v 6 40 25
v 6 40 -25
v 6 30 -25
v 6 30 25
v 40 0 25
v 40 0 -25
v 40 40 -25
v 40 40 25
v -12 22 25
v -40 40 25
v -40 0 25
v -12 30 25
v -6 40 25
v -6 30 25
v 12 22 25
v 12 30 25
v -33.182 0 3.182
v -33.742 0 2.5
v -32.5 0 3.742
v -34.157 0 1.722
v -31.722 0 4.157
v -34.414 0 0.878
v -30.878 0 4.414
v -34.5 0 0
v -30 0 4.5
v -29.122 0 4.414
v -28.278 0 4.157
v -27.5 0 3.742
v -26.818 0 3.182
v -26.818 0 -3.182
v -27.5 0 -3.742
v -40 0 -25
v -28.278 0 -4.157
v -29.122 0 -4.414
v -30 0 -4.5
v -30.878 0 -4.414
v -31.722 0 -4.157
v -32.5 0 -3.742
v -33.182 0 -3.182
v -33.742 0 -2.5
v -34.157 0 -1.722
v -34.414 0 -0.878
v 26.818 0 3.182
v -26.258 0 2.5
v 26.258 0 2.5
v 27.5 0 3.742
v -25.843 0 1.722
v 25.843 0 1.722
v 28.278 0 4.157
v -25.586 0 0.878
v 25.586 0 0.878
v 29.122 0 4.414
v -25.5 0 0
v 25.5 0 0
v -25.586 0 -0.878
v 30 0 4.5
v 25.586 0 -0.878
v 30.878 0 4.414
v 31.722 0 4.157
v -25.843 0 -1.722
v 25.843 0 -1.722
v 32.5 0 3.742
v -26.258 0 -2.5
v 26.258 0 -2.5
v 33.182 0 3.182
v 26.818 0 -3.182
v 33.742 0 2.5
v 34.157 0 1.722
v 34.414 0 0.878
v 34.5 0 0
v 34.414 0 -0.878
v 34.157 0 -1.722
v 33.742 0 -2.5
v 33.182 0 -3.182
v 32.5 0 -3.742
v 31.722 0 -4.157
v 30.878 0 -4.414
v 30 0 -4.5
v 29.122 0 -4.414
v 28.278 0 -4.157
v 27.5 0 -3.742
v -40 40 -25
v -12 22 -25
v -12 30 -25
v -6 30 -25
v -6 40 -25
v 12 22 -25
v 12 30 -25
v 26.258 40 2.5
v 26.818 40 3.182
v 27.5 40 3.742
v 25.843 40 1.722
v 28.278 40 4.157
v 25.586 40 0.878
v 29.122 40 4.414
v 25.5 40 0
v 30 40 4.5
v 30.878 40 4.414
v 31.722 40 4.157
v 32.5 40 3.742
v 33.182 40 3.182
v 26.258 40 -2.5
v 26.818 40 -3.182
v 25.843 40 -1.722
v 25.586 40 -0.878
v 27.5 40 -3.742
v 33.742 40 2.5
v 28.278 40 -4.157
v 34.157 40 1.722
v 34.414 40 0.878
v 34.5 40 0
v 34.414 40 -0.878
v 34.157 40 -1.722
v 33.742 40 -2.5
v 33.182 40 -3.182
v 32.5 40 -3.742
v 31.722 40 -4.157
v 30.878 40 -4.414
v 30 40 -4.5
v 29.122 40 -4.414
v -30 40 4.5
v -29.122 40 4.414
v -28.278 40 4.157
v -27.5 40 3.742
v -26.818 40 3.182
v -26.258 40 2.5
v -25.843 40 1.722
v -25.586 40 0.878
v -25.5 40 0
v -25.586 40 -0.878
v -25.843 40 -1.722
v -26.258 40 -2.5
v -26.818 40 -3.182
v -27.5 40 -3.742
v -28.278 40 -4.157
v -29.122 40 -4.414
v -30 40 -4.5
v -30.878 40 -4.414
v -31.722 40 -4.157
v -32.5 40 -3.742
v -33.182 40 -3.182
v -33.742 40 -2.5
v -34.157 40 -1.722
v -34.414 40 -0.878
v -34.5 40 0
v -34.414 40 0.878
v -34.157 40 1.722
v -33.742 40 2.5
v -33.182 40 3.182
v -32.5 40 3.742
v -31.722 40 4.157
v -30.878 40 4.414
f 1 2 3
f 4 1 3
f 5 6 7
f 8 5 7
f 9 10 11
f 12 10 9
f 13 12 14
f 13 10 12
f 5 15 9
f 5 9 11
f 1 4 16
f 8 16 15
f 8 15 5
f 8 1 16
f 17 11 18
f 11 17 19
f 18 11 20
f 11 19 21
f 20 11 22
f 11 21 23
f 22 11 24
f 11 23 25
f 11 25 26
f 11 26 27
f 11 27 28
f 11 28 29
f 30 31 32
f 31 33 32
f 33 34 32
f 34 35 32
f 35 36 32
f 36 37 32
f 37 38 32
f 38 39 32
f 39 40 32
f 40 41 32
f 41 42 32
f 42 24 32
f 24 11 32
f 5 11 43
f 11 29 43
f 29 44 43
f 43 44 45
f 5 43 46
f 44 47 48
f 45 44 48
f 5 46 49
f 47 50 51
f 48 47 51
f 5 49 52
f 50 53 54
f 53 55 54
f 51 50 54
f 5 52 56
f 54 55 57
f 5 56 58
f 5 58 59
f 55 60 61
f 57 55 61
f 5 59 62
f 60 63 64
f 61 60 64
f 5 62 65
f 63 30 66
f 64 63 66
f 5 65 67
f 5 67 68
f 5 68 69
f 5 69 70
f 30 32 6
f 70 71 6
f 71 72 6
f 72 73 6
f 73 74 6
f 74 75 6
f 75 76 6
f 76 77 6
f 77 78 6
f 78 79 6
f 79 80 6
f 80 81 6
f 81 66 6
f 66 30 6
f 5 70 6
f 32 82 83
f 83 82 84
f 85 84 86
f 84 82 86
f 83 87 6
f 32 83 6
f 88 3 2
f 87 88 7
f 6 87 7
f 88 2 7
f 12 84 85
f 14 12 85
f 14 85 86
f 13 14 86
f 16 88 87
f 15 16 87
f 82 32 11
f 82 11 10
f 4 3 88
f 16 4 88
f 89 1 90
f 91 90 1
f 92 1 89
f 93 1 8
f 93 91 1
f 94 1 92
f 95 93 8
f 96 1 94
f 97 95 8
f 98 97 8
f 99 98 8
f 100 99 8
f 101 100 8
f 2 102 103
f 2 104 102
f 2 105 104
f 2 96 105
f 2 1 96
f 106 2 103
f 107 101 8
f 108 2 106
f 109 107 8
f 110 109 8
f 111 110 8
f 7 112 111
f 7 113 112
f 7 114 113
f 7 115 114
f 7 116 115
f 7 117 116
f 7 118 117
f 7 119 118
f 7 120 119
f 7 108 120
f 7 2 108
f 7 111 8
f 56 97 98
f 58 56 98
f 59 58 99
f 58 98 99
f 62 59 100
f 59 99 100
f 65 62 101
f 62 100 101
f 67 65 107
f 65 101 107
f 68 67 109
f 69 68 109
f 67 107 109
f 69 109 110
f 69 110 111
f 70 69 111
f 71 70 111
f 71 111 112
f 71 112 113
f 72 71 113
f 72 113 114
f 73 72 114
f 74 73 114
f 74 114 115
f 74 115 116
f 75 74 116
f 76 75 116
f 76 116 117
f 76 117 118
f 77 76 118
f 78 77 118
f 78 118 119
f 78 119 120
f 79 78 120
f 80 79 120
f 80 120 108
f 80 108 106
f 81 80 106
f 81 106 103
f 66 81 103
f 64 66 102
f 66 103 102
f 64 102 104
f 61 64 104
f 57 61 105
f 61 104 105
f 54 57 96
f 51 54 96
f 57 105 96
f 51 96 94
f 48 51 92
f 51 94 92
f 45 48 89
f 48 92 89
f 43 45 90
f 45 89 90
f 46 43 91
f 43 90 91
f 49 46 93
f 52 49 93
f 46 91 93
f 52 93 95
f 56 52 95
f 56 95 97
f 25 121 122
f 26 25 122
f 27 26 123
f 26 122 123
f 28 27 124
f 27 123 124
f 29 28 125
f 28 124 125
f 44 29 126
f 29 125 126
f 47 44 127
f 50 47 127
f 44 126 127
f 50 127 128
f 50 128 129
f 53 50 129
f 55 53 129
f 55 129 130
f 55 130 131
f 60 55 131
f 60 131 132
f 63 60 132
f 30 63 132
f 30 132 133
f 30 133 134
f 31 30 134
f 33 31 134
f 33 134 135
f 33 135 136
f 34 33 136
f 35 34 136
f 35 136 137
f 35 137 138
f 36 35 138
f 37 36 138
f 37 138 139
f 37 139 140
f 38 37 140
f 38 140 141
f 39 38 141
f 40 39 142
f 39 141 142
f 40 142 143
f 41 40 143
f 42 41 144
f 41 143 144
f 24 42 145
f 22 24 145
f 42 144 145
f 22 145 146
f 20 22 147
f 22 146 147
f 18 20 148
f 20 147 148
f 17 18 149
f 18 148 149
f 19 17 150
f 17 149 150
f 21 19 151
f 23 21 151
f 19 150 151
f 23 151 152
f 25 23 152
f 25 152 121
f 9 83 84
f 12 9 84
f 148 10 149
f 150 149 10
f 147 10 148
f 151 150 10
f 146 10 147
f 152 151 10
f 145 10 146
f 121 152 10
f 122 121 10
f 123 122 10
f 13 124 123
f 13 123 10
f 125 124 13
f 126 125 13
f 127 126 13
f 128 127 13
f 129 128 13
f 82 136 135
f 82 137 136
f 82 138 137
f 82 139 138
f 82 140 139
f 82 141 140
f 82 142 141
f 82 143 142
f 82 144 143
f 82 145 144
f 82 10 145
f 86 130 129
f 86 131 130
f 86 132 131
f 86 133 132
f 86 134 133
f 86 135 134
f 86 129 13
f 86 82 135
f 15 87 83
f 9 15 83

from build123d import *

# Parameters (mm, degrees)
SKETCH_1_W          = 80
SKETCH_1_H          = 40
EXTRUDE_1_DEPTH     = 50
CUT_EXTRUDE_1_DEPTH = 76.498344353
SKETCH_3_R          = 4.5
CUT_EXTRUDE_2_DEPTH = 62.846584384


with BuildPart() as part:
    # 草图1 → 凸台-拉伸1 (new body)
    with BuildSketch(Plane.XY.offset(-25)):
        with Locations((0, 20)):
            Rectangle(SKETCH_1_W, SKETCH_1_H)
    extrude(amount=EXTRUDE_1_DEPTH)

    # 草图2 → 切除-拉伸1 (cut, through all)
    with BuildSketch(Plane.XY.offset(-25)):
        Polygon((-6, 40), (6, 40), (6, 30), (12, 30), (12, 22), (-12, 22), (-12, 30), (-6, 30), align=None)
    extrude(amount=CUT_EXTRUDE_1_DEPTH, mode=Mode.SUBTRACT)

    # 草图3 → 切除-拉伸2 (cut, through all)
    with BuildSketch(Plane(origin=(0, 40, 0), x_dir=(1, 0, 0), z_dir=(0, 1, 0))):
        with Locations(Location((-30, 0, 0), (0, 0, 270))):
            Circle(SKETCH_3_R)
        with Locations(Location((30, 0, 0), (0, 0, 270))):
            Circle(SKETCH_3_R)
    extrude(amount=-CUT_EXTRUDE_2_DEPTH, mode=Mode.SUBTRACT)


solid = part.part
